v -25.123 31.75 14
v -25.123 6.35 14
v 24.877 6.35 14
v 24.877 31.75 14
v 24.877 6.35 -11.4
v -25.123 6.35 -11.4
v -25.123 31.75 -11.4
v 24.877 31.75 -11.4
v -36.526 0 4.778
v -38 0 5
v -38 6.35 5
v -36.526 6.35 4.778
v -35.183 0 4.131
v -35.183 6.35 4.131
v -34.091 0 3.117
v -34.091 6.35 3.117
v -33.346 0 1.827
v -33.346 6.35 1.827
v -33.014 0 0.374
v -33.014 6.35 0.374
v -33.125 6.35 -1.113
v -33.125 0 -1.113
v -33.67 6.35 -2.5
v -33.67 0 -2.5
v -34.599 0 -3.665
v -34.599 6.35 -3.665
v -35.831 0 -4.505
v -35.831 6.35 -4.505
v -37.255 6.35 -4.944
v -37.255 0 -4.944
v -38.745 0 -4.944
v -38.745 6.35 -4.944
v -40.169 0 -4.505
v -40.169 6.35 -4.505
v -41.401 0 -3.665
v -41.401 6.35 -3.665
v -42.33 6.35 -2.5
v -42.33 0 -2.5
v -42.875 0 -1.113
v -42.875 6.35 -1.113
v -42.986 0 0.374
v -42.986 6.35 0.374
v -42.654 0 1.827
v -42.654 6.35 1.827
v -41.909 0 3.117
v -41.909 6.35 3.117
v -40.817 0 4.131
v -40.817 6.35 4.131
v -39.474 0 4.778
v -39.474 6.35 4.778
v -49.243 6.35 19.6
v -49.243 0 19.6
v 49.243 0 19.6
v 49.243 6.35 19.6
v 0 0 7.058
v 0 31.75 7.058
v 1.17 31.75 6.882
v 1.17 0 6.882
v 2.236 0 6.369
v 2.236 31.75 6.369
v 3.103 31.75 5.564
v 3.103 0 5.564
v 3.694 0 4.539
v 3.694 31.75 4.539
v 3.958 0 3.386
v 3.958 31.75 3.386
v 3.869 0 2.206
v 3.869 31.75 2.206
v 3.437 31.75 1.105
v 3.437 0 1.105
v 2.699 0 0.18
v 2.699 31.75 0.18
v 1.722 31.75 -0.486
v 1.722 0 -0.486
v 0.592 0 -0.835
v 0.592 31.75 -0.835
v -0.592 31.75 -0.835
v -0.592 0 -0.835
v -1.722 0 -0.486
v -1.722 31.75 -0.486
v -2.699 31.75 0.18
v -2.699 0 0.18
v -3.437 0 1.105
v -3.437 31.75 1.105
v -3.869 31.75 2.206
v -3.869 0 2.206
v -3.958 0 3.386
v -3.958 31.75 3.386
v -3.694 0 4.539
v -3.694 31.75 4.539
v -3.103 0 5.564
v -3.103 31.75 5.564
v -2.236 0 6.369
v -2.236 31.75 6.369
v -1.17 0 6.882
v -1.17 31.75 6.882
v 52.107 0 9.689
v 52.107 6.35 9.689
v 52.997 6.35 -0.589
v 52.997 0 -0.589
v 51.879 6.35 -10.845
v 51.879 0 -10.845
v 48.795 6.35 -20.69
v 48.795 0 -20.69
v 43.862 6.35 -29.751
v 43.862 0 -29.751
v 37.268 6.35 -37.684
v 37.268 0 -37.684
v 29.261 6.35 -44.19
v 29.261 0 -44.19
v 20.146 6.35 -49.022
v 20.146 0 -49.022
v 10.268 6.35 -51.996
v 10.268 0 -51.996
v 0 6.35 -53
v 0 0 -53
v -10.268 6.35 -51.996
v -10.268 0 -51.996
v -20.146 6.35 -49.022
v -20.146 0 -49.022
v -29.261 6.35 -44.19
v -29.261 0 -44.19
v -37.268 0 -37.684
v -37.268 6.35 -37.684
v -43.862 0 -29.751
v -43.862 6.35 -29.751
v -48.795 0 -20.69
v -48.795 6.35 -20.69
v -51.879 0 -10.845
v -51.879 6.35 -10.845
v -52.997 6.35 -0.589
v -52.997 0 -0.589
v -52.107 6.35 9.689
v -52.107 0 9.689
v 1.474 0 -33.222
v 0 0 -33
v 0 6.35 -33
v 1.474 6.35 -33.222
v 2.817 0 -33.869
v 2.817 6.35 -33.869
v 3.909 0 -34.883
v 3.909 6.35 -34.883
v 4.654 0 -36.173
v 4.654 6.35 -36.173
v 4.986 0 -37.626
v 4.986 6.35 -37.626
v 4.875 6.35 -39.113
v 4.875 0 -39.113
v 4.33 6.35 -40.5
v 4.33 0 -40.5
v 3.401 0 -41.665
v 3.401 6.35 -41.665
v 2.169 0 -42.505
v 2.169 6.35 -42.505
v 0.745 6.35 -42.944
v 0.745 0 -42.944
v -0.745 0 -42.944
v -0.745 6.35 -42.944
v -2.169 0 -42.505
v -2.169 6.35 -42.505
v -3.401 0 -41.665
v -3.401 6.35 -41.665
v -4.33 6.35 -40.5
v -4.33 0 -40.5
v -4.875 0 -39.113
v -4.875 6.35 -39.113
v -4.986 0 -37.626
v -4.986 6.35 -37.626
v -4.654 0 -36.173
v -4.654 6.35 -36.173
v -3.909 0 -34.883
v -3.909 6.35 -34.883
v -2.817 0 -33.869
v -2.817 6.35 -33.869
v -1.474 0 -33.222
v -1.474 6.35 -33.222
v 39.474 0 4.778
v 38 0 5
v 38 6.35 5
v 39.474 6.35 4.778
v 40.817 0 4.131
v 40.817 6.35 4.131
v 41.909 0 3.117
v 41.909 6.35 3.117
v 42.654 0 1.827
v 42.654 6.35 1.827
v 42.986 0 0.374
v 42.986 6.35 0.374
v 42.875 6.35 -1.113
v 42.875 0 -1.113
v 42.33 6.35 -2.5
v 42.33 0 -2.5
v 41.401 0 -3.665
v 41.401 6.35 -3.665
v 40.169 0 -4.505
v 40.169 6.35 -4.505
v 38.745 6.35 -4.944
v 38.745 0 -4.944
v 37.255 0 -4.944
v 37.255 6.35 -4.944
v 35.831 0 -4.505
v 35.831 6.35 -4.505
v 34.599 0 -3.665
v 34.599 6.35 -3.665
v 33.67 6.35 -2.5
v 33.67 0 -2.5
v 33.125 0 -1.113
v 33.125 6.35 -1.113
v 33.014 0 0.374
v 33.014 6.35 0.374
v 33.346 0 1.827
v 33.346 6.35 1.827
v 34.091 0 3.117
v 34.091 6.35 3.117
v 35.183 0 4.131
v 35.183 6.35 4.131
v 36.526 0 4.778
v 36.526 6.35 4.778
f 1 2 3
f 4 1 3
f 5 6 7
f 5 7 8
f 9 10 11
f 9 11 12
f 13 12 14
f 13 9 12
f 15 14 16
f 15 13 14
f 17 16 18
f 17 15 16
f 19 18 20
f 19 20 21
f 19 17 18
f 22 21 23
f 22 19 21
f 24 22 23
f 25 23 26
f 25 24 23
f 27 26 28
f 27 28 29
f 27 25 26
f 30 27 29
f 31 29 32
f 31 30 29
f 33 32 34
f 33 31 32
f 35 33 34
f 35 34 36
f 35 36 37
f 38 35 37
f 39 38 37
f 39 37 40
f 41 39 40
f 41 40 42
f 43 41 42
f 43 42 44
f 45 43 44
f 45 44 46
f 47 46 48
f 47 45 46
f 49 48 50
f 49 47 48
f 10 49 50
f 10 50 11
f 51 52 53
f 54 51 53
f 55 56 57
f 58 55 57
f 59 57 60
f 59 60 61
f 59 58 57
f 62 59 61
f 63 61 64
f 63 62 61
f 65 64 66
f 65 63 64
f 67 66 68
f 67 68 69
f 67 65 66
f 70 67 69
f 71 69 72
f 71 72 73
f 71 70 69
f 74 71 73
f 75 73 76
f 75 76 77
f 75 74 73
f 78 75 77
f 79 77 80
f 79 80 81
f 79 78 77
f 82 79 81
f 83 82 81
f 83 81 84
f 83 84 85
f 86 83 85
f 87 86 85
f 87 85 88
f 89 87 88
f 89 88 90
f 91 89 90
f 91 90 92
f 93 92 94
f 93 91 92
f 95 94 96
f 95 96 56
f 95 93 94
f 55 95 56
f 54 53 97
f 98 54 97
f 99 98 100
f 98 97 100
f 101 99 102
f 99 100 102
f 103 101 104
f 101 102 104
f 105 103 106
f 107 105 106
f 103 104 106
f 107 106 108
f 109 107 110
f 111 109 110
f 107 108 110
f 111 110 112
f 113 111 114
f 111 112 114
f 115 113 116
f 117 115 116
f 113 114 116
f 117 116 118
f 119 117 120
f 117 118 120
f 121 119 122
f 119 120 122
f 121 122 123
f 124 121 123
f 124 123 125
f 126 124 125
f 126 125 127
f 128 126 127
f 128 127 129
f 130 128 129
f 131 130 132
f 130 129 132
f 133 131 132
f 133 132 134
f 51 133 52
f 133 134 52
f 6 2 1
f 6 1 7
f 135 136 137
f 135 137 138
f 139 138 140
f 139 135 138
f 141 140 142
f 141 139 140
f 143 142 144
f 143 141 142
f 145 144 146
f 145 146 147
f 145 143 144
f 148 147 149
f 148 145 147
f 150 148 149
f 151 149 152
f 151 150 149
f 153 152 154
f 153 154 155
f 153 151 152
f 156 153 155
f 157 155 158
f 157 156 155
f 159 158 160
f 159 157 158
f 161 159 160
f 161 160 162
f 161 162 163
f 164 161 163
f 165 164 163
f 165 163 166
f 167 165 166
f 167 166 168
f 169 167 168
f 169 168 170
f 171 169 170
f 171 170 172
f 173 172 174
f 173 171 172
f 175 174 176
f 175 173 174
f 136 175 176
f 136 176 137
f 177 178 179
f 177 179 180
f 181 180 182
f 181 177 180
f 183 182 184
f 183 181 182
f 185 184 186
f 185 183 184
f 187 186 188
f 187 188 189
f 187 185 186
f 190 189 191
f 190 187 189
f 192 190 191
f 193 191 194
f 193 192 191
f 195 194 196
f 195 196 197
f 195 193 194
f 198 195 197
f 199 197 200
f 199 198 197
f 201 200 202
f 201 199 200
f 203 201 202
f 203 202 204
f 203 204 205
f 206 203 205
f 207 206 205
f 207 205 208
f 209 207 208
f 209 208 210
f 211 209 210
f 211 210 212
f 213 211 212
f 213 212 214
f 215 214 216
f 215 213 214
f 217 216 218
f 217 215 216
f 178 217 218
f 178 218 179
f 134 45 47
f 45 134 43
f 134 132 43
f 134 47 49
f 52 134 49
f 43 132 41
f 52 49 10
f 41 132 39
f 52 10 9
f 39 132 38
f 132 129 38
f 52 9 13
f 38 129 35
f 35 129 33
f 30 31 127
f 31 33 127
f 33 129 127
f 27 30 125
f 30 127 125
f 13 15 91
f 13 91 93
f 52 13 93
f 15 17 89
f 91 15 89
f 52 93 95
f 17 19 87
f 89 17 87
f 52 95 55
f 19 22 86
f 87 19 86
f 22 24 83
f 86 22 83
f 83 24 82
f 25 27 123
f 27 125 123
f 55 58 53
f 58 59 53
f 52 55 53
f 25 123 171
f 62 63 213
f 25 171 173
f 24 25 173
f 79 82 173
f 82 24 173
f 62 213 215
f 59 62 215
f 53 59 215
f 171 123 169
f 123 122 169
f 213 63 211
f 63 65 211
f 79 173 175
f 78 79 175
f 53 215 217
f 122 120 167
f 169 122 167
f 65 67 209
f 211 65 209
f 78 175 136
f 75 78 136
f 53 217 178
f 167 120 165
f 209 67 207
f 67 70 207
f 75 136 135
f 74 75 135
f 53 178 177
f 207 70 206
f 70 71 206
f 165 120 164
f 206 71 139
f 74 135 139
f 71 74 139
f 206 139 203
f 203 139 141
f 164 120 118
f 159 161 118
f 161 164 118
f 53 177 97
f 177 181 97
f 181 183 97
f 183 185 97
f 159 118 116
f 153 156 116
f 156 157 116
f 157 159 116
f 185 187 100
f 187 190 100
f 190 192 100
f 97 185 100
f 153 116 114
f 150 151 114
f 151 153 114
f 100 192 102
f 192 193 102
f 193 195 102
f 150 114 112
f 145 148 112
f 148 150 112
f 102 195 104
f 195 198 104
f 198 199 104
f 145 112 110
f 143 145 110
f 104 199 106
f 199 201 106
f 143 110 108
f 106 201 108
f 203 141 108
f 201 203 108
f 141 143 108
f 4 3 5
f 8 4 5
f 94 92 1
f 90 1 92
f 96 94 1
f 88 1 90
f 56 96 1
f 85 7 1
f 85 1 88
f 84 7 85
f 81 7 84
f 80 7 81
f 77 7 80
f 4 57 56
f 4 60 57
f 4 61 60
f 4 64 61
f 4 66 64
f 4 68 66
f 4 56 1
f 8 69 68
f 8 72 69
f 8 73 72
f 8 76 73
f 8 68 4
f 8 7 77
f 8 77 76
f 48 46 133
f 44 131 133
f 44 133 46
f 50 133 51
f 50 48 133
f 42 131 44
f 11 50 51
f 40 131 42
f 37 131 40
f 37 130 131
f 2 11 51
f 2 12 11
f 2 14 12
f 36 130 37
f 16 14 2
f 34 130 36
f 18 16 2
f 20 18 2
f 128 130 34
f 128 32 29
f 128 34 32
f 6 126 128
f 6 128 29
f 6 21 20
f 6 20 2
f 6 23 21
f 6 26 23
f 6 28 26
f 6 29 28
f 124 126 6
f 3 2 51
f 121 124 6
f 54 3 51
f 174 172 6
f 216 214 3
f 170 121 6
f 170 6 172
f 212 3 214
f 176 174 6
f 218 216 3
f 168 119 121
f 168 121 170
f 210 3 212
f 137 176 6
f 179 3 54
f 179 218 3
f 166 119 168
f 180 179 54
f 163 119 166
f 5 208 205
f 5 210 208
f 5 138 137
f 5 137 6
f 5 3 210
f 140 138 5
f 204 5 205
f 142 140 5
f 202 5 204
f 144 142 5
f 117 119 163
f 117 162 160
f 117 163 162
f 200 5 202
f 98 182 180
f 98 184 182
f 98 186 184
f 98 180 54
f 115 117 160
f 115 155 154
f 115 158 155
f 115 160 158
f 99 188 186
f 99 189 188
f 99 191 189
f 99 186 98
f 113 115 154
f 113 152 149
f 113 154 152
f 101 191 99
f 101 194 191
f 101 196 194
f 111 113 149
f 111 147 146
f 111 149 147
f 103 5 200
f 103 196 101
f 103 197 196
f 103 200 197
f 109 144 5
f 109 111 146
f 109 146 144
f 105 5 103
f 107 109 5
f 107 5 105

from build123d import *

# Parameters (mm, degrees)
SKETCH1_R           = 5
BOSS_EXTRUDE4_DEPTH = 6.35
SKETCH5_W           = 50
SKETCH5_H           = 25.4
BOSS_EXTRUDE5_DEPTH = 25.4
CUT_EXTRUDE1_START  = -31.75
SKETCH6_R           = 3.96875
CUT_EXTRUDE1_DEPTH  = 31.75


with BuildPart() as part:
    # Sketch1 → Boss-Extrude4 (new body)
    with BuildSketch(Plane(origin=(0, 0, 0), x_dir=(1, 0, 0), z_dir=(0, 1, 0))):
        with BuildLine():
            Line((-49.242854308, -19.599522943), (49.242854308, -19.599522943))
            ThreePointArc((49.242854308, -19.599522943), (0, 53), (-49.242854308, -19.599522943))
        make_face()
        with Locations(Location((-38, 0, 0), (0, 0, 270))):
            Circle(SKETCH1_R, mode=Mode.SUBTRACT)
        with Locations(Location((38, 0, 0), (0, 0, 270))):
            Circle(SKETCH1_R, mode=Mode.SUBTRACT)
        with Locations(Location((0, 38, 0), (0, 0, 270))):
            Circle(SKETCH1_R, mode=Mode.SUBTRACT)
    extrude(amount=BOSS_EXTRUDE4_DEPTH)

    # Sketch5 → Boss-Extrude5 (add)
    with BuildSketch(Plane(origin=(0, 6.35, 0), x_dir=(1, 0, 0), z_dir=(0, 1, 0))):
        with Locations((-0.122917413, -1.3)):
            Rectangle(SKETCH5_W, SKETCH5_H)
    extrude(amount=BOSS_EXTRUDE5_DEPTH)

    # Sketch6 → Cut-Extrude1 (cut)
    with BuildSketch(Plane(origin=(0, 31.75, 0), x_dir=(1, 0, 0), z_dir=(0, 1, 0)).offset(CUT_EXTRUDE1_START)):
        with Locations(Location((0, -3.089464921, 0), (0, 0, 270))):
            Circle(SKETCH6_R)
    extrude(amount=CUT_EXTRUDE1_DEPTH, mode=Mode.SUBTRACT)


solid = part.part
